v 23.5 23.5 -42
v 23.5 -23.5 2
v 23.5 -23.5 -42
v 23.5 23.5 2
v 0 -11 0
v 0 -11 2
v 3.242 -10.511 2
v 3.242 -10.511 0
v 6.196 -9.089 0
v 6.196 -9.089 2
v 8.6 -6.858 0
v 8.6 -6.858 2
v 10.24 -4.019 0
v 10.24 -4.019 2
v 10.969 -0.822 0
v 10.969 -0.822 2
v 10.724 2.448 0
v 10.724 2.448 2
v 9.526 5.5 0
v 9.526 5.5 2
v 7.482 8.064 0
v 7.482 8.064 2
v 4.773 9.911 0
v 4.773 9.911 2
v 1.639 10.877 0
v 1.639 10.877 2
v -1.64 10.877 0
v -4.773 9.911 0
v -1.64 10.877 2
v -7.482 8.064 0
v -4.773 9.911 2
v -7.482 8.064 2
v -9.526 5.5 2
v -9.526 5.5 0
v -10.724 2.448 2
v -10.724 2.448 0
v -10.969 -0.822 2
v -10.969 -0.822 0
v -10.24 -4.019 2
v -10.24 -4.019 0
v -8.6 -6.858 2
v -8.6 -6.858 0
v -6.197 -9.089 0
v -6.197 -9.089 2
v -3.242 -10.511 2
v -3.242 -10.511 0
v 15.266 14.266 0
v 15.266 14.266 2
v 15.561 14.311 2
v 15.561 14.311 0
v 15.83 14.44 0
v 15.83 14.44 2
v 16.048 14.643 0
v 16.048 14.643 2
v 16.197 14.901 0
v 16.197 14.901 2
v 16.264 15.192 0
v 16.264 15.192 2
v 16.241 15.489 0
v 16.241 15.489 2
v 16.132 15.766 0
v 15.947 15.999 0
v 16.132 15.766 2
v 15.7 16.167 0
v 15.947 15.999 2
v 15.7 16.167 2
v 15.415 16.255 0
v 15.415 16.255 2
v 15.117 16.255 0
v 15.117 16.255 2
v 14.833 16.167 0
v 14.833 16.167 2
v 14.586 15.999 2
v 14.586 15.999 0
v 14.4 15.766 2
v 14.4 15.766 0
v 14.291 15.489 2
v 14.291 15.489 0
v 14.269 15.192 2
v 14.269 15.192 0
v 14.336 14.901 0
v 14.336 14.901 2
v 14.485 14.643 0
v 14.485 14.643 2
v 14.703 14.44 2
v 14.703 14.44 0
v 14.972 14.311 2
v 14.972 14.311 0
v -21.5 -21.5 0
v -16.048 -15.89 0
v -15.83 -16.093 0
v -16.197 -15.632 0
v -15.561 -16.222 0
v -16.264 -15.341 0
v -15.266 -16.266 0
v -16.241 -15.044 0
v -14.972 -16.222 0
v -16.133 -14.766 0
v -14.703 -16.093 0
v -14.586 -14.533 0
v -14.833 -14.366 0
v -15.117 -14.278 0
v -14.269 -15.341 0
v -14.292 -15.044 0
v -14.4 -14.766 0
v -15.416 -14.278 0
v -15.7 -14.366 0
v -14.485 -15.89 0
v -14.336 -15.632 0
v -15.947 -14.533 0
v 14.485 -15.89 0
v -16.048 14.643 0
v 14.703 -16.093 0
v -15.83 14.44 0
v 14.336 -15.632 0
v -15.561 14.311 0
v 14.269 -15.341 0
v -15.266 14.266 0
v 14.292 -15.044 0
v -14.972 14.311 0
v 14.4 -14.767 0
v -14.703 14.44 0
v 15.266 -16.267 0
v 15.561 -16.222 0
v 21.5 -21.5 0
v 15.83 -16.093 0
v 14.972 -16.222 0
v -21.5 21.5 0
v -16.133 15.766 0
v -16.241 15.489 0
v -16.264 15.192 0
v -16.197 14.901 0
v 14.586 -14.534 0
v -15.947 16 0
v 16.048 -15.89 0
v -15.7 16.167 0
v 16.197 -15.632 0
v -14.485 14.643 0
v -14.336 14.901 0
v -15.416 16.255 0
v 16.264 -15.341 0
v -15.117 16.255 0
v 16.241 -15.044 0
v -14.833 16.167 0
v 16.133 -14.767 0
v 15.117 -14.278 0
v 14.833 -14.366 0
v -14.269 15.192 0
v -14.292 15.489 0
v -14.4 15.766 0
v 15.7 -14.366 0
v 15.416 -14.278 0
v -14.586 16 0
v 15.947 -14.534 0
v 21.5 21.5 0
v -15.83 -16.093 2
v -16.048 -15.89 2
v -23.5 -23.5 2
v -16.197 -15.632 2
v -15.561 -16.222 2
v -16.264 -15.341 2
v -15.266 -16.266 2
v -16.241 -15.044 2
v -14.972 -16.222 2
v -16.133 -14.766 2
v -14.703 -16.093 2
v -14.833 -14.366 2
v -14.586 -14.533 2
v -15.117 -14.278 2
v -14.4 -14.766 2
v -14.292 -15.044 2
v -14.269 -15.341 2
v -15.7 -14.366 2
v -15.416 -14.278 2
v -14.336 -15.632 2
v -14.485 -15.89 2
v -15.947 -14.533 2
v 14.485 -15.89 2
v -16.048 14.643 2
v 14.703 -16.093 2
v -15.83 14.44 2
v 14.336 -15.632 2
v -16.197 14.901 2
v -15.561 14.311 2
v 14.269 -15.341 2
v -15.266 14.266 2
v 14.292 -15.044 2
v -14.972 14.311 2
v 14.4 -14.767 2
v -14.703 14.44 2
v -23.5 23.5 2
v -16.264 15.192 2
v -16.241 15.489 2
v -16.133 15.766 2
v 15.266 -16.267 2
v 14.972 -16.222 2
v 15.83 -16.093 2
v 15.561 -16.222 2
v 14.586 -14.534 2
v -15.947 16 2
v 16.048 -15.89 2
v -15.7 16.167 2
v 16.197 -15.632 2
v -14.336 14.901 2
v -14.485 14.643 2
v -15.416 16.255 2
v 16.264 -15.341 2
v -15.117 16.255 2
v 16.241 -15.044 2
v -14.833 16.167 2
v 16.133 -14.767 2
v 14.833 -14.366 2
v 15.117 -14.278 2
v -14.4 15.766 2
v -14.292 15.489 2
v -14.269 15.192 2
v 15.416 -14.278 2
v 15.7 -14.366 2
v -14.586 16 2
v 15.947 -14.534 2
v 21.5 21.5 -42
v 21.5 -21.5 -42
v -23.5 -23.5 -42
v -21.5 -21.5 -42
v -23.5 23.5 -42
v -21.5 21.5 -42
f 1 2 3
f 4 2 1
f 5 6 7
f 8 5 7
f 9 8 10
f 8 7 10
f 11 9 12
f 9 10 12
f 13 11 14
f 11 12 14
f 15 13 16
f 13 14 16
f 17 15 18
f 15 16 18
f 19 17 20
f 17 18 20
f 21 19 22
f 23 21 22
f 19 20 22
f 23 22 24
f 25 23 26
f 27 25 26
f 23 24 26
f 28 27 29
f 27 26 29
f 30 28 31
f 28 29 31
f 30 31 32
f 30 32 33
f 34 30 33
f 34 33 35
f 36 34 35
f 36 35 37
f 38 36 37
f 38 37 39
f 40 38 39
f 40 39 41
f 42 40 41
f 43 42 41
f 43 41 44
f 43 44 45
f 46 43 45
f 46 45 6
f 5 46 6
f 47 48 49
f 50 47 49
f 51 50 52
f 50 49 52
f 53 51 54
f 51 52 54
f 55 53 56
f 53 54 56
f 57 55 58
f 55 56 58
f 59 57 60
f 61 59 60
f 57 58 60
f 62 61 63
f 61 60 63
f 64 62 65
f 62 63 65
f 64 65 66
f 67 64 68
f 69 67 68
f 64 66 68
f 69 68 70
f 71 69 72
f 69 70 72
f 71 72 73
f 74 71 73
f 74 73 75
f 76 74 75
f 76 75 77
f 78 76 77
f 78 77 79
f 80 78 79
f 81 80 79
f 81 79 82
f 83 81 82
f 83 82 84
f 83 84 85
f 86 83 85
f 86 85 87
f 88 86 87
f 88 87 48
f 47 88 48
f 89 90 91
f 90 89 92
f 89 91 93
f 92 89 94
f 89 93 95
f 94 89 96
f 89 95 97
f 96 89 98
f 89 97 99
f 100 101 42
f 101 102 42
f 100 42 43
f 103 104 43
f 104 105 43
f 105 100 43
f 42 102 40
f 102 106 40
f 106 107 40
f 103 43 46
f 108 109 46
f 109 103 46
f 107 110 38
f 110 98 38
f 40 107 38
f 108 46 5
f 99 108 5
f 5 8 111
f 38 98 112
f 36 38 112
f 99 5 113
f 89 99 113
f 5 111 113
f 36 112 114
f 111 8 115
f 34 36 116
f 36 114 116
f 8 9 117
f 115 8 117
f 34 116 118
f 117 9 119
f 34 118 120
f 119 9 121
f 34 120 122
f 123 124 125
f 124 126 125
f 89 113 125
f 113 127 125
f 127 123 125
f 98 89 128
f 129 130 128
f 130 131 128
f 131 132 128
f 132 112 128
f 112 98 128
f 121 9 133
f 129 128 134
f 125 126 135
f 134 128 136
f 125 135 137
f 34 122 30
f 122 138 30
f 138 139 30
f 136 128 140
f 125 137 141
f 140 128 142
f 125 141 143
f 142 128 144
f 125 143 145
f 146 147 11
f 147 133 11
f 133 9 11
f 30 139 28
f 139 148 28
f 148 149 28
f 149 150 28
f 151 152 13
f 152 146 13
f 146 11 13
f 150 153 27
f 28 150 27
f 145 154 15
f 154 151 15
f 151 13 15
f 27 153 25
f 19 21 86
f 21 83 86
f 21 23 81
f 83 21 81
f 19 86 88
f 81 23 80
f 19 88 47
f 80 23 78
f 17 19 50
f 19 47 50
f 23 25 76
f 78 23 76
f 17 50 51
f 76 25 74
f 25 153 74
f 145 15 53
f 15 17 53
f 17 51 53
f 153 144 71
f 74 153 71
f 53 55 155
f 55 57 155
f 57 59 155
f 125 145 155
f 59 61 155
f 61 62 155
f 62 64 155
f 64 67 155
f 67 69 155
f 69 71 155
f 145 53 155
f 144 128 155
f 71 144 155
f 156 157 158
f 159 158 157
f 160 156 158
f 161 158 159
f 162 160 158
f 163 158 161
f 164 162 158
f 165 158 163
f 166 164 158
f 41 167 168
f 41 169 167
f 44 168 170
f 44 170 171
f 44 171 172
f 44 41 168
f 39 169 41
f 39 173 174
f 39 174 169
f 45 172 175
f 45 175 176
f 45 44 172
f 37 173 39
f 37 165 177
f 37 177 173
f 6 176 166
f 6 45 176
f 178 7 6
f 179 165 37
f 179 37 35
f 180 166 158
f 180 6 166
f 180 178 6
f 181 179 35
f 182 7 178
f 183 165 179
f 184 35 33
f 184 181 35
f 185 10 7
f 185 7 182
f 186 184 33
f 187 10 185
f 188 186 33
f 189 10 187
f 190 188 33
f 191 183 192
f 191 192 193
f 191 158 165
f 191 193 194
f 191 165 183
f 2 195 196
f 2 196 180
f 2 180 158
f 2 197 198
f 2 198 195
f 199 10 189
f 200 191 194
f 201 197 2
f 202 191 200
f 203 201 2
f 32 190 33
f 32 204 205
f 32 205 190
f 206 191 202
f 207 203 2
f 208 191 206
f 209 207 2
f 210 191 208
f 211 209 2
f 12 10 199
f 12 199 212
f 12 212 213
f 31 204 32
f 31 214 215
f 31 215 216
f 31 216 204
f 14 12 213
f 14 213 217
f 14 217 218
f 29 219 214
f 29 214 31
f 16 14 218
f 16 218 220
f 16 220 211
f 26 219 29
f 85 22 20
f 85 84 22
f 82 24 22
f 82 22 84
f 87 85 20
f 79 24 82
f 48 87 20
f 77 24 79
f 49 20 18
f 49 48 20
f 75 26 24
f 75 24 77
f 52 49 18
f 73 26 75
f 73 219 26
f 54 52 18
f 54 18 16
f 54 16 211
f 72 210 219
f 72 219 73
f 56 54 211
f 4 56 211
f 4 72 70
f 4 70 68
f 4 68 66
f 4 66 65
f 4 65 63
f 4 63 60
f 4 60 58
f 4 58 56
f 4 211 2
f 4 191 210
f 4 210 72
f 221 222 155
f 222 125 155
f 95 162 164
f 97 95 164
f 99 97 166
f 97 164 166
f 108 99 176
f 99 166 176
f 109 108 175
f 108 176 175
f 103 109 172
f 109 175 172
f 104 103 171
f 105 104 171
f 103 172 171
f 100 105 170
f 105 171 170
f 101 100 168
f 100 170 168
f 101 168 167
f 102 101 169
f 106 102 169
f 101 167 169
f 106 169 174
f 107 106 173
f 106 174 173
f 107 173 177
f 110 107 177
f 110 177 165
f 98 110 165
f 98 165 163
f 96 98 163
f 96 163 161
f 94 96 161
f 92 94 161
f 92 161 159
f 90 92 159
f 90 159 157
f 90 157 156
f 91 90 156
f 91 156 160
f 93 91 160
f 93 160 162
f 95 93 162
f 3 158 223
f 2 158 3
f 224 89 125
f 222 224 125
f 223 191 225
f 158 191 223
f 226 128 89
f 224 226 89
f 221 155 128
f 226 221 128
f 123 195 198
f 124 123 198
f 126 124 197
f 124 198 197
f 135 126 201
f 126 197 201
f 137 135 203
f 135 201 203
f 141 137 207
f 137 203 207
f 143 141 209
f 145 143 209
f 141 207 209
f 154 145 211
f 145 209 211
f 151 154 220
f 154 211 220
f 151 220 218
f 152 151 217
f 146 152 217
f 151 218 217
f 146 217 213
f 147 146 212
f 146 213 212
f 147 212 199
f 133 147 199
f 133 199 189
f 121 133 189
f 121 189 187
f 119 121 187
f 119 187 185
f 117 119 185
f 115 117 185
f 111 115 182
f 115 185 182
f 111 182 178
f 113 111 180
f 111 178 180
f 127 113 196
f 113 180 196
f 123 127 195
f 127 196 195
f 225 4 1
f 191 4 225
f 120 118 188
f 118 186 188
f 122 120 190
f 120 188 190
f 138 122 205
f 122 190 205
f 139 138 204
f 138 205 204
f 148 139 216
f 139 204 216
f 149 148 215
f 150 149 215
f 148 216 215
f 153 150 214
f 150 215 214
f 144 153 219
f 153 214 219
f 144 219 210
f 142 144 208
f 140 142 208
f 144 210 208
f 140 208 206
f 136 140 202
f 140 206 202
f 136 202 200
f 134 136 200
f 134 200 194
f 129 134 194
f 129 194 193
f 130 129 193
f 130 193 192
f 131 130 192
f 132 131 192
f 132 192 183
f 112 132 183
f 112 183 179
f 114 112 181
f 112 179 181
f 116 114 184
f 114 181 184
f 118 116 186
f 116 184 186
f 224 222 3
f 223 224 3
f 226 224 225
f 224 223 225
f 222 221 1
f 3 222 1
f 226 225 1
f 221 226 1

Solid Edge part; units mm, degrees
sketch "Sketch1" plane through (0, 0, 0) normal (0, 0, 1) x (1, 0, 0)
  line L0 (-21.5, 21.5001) -> (-21.5, -21.4999)
  line L1 (-21.5, -21.4999) -> (21.5, -21.4999)
  line L2 (21.5, -21.4999) -> (21.5, 21.5001)
  line L3 (21.5, 21.5001) -> (-21.5, 21.5001)
extrude "Protrusion1" add sketch "Sketch1" against normal blind 42
shell "Thinwall_1" thickness 0 removed faces 1 at (-14.7633, -13.9032, -42) outside thickness 2
hole "Hole_1" at (15.2665, -15.2666, 2) direction (0, 0, -1) diameter 2 end up to next
hole "Hole1" at (-15.2665, -15.2665, 2) direction (0, 0, -1) diameter 2 end up to next
hole "Hole2" at (-15.2665, 15.2665, 2) direction (0, 0, -1) diameter 2 end up to next
hole "Hole3" at (15.2664, 15.2664, 2) direction (0, 0, -1) diameter 2 end up to next
hole "Hole_6" at (-0.0001, 0, 2) direction (0, 0, -1) diameter 22 end up to next
